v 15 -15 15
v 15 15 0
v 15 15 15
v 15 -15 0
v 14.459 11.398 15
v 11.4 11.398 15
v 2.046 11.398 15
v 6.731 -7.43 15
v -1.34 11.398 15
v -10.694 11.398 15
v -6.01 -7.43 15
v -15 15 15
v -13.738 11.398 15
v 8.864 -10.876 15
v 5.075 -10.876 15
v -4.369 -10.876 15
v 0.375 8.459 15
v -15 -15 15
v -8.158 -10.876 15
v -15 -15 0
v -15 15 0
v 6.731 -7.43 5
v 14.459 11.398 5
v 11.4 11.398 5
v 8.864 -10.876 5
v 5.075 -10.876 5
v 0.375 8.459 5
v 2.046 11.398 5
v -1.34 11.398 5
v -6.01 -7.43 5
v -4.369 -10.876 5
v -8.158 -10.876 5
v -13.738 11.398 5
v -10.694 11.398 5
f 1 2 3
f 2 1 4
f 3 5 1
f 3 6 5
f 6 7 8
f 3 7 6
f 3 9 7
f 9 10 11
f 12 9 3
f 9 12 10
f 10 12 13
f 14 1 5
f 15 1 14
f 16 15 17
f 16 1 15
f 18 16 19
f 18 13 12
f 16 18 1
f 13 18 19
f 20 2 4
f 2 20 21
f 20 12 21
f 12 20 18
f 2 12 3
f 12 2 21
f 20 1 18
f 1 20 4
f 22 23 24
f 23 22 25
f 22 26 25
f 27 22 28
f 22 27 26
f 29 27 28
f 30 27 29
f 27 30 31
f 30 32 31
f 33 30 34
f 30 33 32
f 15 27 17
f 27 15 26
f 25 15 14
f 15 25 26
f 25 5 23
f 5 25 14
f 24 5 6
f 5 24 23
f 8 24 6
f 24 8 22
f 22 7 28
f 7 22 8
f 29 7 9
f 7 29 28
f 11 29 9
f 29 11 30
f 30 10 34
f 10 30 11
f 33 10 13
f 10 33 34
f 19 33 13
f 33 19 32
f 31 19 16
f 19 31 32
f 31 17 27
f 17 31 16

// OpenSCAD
// LetterBlock.scad - Basic usage of text() and linear_extrude()

// Module instantiation
LetterBlock("W");

// Module definition.
// size=30 defines an optional parameter with a default value.
module LetterBlock(letter, size=30) {
    difference() {
        translate([0,0,size/4]) cube([size,size,size/2], center=true);
        translate([0,0,size/6]) {
            // convexity is needed for correct preview
            // since characters can be highly concave
            linear_extrude(height=size, convexity=4)
                text(letter, 
                     size=size*22/30,
                     font="Bitstream Vera Sans",
                     halign="center",
                     valign="center");
        }
    }
}

echo(version=version());
